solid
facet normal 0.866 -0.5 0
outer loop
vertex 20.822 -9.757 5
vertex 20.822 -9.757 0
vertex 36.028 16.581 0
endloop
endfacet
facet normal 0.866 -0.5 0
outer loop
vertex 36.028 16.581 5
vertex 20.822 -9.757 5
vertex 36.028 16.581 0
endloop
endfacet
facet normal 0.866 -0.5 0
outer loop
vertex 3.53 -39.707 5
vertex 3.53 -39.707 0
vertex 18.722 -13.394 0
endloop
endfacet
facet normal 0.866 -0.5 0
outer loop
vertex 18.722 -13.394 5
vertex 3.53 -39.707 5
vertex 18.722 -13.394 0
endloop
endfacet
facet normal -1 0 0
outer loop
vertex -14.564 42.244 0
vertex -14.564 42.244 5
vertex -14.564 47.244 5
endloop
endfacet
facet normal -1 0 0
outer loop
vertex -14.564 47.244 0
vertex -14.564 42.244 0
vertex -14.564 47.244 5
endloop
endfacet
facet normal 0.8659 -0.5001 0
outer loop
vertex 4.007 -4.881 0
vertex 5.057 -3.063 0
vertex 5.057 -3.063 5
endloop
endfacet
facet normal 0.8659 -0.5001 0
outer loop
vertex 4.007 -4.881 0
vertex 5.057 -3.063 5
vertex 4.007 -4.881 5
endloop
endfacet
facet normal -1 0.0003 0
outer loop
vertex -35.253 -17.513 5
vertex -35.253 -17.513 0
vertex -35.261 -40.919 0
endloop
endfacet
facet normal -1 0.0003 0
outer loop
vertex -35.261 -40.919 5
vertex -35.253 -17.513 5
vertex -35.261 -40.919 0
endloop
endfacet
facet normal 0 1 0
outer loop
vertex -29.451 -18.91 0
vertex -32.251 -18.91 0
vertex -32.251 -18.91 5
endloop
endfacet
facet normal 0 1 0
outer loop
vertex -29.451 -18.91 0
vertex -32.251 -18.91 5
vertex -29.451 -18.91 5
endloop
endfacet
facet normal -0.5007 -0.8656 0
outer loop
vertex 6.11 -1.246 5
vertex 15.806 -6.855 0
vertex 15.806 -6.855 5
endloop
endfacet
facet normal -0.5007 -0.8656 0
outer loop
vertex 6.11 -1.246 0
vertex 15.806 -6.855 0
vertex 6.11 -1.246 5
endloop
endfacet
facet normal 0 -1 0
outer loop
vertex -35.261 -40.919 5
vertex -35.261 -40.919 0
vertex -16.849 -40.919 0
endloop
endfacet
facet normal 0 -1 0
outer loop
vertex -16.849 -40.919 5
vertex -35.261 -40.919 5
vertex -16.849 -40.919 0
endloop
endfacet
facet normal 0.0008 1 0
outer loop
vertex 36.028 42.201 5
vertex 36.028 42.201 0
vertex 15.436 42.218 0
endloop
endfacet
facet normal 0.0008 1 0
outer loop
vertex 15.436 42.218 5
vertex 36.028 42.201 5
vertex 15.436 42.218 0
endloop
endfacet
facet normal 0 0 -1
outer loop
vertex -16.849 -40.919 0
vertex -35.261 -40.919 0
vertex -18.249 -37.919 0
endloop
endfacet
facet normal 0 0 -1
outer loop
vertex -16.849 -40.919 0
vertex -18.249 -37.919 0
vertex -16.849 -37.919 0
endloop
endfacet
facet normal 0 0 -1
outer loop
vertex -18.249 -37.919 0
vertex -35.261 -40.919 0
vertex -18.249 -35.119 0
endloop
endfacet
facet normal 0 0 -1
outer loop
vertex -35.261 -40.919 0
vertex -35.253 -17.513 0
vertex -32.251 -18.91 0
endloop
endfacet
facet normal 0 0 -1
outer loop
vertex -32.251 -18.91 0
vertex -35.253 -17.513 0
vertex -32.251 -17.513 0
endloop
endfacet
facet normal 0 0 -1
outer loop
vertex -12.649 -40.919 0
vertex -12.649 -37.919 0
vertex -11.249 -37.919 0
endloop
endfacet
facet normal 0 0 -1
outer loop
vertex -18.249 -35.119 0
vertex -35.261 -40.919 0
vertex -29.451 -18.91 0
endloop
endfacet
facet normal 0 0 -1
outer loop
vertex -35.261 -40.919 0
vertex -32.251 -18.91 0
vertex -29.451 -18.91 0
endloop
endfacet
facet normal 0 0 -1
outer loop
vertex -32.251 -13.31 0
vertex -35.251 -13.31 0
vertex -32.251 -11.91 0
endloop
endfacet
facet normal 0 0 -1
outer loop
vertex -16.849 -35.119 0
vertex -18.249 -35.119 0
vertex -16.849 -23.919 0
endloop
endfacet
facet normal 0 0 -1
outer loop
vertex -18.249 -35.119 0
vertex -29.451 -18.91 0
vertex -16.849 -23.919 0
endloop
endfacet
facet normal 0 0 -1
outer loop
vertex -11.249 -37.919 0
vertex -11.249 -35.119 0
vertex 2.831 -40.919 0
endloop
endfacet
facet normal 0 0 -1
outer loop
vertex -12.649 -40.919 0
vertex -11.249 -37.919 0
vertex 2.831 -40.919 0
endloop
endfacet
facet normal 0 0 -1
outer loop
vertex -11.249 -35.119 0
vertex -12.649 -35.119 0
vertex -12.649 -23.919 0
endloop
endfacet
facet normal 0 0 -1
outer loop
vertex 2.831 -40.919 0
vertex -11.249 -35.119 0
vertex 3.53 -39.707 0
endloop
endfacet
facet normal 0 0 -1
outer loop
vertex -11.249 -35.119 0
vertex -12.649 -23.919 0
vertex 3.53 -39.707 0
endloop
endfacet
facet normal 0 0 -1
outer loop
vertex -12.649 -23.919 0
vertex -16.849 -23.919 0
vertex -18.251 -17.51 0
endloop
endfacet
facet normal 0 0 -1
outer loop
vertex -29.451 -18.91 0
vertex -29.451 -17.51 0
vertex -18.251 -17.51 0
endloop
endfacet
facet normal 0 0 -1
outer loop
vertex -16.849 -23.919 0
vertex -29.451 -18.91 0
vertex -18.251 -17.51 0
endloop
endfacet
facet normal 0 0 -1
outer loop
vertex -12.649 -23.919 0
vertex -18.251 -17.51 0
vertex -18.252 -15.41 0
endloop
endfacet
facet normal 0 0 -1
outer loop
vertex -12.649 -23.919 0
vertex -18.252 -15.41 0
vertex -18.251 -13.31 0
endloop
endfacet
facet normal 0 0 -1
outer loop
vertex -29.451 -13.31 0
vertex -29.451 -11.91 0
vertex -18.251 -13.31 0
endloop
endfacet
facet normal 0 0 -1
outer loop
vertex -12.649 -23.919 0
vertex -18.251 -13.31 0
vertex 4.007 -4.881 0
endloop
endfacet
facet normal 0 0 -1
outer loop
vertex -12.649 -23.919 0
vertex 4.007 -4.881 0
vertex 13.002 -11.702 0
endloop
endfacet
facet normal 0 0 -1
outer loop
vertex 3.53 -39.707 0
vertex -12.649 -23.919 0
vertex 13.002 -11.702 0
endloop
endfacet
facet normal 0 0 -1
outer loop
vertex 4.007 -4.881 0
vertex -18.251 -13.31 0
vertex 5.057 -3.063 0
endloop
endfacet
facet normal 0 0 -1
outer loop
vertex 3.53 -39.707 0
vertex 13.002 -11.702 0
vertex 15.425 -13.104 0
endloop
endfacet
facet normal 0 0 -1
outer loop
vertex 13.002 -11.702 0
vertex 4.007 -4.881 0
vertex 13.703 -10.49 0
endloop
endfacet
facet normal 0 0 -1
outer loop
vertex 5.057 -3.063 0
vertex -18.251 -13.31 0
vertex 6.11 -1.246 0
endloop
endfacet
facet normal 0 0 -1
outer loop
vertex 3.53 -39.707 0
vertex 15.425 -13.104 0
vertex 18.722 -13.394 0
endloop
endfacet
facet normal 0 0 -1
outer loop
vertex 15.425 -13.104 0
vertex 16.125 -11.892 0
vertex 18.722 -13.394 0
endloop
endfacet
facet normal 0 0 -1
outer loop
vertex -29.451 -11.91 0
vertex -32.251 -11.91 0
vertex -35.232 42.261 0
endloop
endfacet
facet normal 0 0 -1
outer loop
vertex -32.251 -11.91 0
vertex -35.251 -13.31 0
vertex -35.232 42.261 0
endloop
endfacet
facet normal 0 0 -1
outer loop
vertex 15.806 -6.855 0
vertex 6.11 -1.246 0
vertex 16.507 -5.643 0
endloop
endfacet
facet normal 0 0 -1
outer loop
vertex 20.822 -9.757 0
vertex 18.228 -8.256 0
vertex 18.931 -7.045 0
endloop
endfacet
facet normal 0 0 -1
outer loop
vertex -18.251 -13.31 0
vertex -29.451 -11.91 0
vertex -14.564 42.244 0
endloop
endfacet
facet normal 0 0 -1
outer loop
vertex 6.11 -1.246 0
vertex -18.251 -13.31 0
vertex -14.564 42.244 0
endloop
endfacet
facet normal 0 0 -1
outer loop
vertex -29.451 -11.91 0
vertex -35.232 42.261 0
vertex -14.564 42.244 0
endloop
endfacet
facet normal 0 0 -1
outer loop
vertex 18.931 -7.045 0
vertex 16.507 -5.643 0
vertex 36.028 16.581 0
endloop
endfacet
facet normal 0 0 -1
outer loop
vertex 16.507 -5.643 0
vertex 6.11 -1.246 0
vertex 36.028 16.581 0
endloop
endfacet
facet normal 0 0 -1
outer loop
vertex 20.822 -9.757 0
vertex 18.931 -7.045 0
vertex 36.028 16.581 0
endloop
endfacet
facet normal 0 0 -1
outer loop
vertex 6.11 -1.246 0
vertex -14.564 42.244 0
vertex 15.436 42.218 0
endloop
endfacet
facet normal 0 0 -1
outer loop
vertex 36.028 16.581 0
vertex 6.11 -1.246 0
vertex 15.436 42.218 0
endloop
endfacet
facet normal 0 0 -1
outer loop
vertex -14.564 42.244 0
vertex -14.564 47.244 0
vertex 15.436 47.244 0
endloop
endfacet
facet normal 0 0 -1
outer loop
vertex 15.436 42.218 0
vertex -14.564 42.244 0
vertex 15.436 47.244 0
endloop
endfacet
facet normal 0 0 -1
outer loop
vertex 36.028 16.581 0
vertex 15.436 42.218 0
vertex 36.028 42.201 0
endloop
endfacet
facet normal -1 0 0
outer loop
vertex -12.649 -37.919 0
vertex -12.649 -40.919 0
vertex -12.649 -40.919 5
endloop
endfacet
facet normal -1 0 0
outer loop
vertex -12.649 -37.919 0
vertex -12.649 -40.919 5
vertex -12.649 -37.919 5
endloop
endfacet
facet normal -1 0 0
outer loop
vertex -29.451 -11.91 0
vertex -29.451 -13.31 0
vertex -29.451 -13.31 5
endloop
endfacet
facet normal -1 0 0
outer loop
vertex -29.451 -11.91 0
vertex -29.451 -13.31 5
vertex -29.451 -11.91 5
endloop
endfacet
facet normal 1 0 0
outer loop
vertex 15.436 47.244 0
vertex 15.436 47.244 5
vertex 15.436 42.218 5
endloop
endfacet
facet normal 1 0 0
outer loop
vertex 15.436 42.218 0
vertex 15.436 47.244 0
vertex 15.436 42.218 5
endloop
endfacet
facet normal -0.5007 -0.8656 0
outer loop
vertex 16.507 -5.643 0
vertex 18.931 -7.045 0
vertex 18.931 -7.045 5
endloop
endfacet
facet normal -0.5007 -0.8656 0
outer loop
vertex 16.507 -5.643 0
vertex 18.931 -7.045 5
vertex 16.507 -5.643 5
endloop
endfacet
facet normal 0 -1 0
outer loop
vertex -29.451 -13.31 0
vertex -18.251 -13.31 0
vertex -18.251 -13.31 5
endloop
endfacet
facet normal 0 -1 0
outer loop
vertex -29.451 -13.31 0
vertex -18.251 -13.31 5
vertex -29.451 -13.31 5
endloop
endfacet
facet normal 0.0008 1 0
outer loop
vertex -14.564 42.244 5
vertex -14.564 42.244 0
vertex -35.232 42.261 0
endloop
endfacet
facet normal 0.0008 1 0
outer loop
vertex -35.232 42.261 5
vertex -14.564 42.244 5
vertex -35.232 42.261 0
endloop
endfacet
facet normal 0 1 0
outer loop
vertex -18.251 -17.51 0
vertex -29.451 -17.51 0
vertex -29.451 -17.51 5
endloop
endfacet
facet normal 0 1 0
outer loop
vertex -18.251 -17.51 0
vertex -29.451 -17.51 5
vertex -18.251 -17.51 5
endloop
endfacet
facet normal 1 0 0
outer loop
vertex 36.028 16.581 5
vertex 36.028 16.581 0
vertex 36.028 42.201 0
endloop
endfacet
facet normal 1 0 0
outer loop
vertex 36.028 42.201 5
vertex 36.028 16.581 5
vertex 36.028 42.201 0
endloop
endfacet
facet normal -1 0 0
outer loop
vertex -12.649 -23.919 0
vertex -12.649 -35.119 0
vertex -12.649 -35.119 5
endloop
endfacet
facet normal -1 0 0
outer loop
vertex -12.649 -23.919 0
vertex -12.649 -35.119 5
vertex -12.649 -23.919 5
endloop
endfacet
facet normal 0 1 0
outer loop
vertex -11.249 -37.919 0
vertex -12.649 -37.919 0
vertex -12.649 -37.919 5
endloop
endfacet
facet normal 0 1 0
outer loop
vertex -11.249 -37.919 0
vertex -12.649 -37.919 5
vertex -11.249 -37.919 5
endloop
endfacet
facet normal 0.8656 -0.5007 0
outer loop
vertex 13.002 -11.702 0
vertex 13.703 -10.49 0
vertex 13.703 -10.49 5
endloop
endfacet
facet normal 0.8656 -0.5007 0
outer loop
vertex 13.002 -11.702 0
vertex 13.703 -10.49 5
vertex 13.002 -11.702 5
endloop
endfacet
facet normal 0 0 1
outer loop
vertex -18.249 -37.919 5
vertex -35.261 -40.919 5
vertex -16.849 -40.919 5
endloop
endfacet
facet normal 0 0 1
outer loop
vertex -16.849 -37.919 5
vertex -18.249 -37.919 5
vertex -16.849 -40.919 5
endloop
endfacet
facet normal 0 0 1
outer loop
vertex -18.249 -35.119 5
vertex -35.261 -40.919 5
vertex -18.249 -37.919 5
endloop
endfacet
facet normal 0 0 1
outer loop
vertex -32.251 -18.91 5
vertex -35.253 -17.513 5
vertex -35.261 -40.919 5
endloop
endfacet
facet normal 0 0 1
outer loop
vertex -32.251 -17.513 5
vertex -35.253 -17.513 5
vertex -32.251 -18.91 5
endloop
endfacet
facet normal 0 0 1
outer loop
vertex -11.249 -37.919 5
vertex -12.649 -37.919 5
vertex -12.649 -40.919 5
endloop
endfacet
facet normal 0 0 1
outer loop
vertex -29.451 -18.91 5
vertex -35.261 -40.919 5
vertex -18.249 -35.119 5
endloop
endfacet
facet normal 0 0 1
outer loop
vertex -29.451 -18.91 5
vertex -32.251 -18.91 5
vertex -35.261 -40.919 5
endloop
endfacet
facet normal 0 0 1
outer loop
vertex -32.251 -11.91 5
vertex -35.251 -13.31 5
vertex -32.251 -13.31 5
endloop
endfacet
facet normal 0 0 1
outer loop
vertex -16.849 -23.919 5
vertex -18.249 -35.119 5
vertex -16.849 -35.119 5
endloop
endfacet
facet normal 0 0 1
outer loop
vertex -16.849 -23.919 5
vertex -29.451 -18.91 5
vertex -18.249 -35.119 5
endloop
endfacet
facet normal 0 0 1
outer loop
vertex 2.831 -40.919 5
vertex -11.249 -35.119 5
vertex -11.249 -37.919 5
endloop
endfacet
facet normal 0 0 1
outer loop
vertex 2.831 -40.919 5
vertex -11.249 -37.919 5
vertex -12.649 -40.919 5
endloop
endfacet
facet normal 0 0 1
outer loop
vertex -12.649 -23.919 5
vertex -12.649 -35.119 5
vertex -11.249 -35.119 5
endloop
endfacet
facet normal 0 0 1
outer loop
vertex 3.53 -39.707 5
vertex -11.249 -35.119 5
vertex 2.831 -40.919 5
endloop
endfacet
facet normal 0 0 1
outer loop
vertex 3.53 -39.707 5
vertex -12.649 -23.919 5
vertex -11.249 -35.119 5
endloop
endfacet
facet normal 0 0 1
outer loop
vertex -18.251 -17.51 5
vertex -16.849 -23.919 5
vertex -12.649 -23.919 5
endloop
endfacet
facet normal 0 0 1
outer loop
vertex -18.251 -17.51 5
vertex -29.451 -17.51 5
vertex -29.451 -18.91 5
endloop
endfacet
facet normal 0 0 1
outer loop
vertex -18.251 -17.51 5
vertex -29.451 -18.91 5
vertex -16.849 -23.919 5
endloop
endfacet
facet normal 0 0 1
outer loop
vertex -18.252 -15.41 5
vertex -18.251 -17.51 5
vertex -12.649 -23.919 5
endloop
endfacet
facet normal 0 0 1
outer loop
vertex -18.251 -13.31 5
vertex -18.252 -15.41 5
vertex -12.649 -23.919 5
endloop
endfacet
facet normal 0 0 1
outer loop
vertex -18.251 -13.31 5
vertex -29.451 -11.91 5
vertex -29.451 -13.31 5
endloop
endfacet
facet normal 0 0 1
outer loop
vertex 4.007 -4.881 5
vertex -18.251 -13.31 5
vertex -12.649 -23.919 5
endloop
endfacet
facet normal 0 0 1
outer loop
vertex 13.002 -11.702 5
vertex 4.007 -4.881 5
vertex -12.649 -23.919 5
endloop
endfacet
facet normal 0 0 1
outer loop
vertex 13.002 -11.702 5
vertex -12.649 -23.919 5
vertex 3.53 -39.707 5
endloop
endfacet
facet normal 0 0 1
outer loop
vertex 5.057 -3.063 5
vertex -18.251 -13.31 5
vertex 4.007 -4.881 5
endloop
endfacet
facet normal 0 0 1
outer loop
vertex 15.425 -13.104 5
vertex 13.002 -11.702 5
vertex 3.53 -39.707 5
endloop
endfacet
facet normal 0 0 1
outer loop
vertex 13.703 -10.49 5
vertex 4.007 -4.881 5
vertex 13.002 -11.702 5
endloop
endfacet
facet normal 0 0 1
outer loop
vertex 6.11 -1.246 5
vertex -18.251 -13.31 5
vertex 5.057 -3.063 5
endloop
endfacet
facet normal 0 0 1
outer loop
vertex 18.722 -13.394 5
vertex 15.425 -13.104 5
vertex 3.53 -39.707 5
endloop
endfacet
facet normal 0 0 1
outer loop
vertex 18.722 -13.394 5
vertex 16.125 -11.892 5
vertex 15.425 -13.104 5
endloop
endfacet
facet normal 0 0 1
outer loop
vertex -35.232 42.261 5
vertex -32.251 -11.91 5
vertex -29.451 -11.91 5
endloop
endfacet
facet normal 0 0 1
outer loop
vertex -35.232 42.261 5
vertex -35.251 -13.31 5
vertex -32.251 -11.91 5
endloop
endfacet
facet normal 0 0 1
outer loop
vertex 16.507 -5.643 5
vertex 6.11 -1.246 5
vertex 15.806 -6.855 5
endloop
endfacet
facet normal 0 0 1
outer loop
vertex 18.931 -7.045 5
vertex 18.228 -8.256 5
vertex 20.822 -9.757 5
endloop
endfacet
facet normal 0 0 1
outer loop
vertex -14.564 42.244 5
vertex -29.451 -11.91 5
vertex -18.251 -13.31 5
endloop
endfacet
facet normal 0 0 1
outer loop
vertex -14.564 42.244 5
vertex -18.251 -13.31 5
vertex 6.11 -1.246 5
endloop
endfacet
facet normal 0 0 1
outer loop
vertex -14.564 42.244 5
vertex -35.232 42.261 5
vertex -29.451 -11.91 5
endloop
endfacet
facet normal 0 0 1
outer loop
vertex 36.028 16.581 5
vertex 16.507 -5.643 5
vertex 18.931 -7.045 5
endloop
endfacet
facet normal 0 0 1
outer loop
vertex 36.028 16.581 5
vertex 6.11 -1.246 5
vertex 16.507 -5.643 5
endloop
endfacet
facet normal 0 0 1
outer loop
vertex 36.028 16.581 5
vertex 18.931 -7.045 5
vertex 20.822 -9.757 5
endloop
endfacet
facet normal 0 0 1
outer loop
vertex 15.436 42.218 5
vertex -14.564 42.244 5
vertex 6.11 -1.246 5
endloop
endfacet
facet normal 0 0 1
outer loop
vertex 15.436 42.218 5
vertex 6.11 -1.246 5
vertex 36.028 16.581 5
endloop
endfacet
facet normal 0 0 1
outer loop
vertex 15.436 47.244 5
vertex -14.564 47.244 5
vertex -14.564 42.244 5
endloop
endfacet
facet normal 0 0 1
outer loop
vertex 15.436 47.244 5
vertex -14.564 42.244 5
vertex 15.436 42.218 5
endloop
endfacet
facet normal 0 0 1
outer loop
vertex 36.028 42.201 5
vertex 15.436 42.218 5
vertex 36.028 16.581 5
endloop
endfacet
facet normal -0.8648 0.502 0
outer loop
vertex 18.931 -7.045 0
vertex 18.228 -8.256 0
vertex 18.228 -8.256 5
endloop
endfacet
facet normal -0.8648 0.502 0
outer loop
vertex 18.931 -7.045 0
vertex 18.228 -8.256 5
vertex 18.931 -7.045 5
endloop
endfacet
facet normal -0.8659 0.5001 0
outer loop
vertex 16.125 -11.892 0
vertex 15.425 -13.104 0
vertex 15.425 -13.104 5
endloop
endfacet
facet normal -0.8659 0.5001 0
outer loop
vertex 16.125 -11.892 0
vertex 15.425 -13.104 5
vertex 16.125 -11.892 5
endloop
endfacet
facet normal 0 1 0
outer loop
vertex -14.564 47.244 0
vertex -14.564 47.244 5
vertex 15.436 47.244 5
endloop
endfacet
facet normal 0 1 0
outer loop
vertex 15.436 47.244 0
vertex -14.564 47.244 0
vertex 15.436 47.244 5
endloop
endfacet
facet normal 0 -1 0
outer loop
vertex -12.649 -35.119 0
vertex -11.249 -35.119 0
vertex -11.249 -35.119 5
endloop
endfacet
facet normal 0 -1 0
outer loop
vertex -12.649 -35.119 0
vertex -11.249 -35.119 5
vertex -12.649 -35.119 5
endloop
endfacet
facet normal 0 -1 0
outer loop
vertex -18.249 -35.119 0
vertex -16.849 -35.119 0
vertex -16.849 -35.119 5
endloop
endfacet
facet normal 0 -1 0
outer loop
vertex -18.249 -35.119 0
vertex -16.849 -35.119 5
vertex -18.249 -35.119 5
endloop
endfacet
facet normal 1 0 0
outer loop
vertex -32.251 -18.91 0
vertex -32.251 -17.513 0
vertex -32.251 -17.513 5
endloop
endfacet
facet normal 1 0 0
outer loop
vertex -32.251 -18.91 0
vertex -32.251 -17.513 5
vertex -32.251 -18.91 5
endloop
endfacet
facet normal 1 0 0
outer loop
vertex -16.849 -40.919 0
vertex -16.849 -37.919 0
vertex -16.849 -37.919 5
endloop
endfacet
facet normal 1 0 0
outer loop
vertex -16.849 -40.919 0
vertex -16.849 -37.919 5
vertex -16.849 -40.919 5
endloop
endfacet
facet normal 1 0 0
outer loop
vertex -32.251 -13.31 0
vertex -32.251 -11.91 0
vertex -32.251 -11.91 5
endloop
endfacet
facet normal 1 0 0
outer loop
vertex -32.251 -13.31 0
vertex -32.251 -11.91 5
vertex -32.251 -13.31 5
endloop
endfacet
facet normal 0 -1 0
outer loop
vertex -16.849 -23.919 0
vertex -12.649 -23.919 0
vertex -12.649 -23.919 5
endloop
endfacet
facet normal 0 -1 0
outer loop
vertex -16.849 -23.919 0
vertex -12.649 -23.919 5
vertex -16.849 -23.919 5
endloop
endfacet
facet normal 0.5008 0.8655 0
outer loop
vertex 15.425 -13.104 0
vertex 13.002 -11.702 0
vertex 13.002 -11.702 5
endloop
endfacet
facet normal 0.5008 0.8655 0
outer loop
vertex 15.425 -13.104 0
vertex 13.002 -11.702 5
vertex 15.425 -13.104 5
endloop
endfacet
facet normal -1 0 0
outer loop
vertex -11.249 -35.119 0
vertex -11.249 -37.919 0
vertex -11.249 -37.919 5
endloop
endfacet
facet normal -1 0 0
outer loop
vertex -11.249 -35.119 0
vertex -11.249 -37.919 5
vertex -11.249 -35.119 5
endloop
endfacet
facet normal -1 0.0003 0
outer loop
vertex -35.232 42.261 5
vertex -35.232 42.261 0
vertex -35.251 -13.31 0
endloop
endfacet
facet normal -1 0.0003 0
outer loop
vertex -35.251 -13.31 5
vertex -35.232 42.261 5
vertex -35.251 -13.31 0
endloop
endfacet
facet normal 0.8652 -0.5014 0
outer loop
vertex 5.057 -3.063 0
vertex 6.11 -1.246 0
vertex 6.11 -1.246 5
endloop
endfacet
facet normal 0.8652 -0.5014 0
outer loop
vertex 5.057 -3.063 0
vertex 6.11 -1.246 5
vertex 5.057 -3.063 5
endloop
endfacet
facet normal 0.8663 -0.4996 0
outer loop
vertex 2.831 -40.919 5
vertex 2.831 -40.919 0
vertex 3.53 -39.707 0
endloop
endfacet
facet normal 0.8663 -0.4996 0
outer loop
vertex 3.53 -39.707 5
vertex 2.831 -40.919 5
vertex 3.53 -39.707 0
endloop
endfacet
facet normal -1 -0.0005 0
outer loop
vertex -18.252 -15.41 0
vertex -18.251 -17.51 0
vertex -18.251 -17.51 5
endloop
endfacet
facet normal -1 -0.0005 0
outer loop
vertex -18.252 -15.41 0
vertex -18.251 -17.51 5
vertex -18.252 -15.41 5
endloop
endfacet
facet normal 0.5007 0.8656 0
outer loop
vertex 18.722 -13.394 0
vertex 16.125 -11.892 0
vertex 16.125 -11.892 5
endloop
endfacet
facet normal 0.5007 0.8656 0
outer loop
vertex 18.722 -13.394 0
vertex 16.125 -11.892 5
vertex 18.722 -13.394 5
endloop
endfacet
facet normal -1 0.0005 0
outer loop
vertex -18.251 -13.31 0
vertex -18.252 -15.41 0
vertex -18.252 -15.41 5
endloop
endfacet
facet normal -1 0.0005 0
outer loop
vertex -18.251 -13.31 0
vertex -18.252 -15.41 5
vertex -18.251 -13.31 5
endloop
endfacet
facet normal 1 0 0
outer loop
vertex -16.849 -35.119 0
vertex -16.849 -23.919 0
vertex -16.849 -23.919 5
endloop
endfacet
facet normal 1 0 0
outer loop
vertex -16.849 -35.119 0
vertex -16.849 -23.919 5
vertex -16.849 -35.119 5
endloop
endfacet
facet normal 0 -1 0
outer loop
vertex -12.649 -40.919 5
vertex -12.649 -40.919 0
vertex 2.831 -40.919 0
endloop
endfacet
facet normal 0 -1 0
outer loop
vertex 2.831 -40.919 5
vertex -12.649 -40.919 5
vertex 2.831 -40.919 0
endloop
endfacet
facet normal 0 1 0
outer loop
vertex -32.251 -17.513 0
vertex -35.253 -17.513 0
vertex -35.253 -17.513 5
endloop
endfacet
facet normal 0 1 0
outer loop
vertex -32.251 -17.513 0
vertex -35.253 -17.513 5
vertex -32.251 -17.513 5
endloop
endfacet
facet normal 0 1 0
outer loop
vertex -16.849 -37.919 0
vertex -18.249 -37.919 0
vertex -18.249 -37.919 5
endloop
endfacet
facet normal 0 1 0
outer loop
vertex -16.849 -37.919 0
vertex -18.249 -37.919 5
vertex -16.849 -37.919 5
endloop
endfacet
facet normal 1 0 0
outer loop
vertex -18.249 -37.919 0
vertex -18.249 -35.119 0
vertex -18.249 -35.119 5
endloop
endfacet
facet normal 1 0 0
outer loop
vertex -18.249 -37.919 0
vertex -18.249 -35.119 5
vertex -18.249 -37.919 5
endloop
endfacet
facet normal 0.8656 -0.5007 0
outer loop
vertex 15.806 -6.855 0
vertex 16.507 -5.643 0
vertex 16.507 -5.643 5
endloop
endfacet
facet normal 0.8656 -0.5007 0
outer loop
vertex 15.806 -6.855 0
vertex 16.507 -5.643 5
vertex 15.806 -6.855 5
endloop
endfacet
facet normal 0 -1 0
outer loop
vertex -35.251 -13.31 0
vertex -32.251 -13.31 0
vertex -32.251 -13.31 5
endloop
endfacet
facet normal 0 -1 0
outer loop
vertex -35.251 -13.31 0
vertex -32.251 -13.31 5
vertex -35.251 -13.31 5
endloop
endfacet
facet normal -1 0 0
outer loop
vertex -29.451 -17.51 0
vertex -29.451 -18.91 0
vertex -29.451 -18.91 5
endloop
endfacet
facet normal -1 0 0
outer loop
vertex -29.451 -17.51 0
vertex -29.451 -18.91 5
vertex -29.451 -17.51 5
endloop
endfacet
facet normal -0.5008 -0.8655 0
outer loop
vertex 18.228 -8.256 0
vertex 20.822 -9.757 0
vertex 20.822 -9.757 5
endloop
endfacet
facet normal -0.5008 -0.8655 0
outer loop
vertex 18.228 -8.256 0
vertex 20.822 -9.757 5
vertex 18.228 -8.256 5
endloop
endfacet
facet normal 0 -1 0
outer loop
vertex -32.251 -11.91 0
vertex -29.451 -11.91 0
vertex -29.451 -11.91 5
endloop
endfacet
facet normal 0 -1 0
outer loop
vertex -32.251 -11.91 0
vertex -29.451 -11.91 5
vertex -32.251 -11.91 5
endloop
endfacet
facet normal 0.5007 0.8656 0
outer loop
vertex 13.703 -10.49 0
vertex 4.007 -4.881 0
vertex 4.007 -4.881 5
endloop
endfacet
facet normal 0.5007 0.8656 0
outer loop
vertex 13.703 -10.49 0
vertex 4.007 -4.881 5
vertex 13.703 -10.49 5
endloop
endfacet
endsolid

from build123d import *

# Parameters (mm, degrees)
BOSS_EXTRUDE1_DEPTH = 5
CUT_EXTRUDE3_START  = -5
CUT_EXTRUDE3_DEPTH  = 5
BOSS_EXTRUDE2_DEPTH = 5


# Read off the part's stored shape, not the designer's step: Cut-Extrude3
with BuildPart() as part:
    # Sketch1 → Boss-Extrude1 (new body)
    with BuildSketch(Plane.XY):
        Polygon((-35.261138019, -40.918717749), (2.830677256, -40.918717749), (3.530317734, -39.706904894), (36.028317734, 16.581282251), (36.028317734, 42.200866684), (-35.231632156, 42.261282251), align=None)
    extrude(amount=BOSS_EXTRUDE1_DEPTH)

    # Cut-Extrude3 outline → Cut-Extrude3 (cut)
    with BuildSketch(Plane.XY.offset(5).offset(CUT_EXTRUDE3_START)):
        Polygon((16.125363943, -11.891644937), (18.722168425, -13.393847636), (20.82216918, -9.756539633), (18.228446966, -8.256119968), (18.930502063, -7.044872657), (16.506818751, -5.642817308), (15.805791076, -6.854658964), (6.110026049, -1.245840704), (5.056943403, -3.062711671), (4.006943025, -4.881365673), (13.702708053, -10.490183932), (13.001680379, -11.702025589), (15.425363691, -13.104080938), align=None)
        Polygon((-35.251344401, -13.309523063), (-35.25283547, -17.512996385), (-32.25134298, -17.512996385), (-32.2508476, -18.909523063), (-29.4508476, -18.909523063), (-29.4508476, -17.509523063), (-18.251343332, -17.509523063), (-18.25208825, -15.409523063), (-18.251343332, -13.309523063), (-29.4508476, -13.309523063), (-29.4508476, -11.909523063), (-32.2508476, -11.909523063), (-32.251344213, -13.309523063), align=None)
        Polygon((-16.848777516, -40.918717749), (-12.648777516, -40.918717749), (-12.648777516, -37.918717749), (-11.248777516, -37.918717749), (-11.248777516, -35.118717749), (-12.648777516, -35.118717749), (-12.648777516, -23.918717749), (-16.848777516, -23.918717749), (-16.848777516, -35.118717749), (-18.248777516, -35.118717749), (-18.248777516, -37.918717749), (-16.848777516, -37.918717749), align=None)
    extrude(amount=CUT_EXTRUDE3_DEPTH, mode=Mode.SUBTRACT)

    # Sketch3 → Boss-Extrude2 (add)
    with BuildSketch(Plane.XY.offset(5)):
        Polygon((-14.56360213, 47.243759494), (15.43639787, 47.243759494), (15.43639787, 42.218324913), (-14.56360213, 42.243759494), align=None)
    extrude(amount=-BOSS_EXTRUDE2_DEPTH)


solid = part.part
